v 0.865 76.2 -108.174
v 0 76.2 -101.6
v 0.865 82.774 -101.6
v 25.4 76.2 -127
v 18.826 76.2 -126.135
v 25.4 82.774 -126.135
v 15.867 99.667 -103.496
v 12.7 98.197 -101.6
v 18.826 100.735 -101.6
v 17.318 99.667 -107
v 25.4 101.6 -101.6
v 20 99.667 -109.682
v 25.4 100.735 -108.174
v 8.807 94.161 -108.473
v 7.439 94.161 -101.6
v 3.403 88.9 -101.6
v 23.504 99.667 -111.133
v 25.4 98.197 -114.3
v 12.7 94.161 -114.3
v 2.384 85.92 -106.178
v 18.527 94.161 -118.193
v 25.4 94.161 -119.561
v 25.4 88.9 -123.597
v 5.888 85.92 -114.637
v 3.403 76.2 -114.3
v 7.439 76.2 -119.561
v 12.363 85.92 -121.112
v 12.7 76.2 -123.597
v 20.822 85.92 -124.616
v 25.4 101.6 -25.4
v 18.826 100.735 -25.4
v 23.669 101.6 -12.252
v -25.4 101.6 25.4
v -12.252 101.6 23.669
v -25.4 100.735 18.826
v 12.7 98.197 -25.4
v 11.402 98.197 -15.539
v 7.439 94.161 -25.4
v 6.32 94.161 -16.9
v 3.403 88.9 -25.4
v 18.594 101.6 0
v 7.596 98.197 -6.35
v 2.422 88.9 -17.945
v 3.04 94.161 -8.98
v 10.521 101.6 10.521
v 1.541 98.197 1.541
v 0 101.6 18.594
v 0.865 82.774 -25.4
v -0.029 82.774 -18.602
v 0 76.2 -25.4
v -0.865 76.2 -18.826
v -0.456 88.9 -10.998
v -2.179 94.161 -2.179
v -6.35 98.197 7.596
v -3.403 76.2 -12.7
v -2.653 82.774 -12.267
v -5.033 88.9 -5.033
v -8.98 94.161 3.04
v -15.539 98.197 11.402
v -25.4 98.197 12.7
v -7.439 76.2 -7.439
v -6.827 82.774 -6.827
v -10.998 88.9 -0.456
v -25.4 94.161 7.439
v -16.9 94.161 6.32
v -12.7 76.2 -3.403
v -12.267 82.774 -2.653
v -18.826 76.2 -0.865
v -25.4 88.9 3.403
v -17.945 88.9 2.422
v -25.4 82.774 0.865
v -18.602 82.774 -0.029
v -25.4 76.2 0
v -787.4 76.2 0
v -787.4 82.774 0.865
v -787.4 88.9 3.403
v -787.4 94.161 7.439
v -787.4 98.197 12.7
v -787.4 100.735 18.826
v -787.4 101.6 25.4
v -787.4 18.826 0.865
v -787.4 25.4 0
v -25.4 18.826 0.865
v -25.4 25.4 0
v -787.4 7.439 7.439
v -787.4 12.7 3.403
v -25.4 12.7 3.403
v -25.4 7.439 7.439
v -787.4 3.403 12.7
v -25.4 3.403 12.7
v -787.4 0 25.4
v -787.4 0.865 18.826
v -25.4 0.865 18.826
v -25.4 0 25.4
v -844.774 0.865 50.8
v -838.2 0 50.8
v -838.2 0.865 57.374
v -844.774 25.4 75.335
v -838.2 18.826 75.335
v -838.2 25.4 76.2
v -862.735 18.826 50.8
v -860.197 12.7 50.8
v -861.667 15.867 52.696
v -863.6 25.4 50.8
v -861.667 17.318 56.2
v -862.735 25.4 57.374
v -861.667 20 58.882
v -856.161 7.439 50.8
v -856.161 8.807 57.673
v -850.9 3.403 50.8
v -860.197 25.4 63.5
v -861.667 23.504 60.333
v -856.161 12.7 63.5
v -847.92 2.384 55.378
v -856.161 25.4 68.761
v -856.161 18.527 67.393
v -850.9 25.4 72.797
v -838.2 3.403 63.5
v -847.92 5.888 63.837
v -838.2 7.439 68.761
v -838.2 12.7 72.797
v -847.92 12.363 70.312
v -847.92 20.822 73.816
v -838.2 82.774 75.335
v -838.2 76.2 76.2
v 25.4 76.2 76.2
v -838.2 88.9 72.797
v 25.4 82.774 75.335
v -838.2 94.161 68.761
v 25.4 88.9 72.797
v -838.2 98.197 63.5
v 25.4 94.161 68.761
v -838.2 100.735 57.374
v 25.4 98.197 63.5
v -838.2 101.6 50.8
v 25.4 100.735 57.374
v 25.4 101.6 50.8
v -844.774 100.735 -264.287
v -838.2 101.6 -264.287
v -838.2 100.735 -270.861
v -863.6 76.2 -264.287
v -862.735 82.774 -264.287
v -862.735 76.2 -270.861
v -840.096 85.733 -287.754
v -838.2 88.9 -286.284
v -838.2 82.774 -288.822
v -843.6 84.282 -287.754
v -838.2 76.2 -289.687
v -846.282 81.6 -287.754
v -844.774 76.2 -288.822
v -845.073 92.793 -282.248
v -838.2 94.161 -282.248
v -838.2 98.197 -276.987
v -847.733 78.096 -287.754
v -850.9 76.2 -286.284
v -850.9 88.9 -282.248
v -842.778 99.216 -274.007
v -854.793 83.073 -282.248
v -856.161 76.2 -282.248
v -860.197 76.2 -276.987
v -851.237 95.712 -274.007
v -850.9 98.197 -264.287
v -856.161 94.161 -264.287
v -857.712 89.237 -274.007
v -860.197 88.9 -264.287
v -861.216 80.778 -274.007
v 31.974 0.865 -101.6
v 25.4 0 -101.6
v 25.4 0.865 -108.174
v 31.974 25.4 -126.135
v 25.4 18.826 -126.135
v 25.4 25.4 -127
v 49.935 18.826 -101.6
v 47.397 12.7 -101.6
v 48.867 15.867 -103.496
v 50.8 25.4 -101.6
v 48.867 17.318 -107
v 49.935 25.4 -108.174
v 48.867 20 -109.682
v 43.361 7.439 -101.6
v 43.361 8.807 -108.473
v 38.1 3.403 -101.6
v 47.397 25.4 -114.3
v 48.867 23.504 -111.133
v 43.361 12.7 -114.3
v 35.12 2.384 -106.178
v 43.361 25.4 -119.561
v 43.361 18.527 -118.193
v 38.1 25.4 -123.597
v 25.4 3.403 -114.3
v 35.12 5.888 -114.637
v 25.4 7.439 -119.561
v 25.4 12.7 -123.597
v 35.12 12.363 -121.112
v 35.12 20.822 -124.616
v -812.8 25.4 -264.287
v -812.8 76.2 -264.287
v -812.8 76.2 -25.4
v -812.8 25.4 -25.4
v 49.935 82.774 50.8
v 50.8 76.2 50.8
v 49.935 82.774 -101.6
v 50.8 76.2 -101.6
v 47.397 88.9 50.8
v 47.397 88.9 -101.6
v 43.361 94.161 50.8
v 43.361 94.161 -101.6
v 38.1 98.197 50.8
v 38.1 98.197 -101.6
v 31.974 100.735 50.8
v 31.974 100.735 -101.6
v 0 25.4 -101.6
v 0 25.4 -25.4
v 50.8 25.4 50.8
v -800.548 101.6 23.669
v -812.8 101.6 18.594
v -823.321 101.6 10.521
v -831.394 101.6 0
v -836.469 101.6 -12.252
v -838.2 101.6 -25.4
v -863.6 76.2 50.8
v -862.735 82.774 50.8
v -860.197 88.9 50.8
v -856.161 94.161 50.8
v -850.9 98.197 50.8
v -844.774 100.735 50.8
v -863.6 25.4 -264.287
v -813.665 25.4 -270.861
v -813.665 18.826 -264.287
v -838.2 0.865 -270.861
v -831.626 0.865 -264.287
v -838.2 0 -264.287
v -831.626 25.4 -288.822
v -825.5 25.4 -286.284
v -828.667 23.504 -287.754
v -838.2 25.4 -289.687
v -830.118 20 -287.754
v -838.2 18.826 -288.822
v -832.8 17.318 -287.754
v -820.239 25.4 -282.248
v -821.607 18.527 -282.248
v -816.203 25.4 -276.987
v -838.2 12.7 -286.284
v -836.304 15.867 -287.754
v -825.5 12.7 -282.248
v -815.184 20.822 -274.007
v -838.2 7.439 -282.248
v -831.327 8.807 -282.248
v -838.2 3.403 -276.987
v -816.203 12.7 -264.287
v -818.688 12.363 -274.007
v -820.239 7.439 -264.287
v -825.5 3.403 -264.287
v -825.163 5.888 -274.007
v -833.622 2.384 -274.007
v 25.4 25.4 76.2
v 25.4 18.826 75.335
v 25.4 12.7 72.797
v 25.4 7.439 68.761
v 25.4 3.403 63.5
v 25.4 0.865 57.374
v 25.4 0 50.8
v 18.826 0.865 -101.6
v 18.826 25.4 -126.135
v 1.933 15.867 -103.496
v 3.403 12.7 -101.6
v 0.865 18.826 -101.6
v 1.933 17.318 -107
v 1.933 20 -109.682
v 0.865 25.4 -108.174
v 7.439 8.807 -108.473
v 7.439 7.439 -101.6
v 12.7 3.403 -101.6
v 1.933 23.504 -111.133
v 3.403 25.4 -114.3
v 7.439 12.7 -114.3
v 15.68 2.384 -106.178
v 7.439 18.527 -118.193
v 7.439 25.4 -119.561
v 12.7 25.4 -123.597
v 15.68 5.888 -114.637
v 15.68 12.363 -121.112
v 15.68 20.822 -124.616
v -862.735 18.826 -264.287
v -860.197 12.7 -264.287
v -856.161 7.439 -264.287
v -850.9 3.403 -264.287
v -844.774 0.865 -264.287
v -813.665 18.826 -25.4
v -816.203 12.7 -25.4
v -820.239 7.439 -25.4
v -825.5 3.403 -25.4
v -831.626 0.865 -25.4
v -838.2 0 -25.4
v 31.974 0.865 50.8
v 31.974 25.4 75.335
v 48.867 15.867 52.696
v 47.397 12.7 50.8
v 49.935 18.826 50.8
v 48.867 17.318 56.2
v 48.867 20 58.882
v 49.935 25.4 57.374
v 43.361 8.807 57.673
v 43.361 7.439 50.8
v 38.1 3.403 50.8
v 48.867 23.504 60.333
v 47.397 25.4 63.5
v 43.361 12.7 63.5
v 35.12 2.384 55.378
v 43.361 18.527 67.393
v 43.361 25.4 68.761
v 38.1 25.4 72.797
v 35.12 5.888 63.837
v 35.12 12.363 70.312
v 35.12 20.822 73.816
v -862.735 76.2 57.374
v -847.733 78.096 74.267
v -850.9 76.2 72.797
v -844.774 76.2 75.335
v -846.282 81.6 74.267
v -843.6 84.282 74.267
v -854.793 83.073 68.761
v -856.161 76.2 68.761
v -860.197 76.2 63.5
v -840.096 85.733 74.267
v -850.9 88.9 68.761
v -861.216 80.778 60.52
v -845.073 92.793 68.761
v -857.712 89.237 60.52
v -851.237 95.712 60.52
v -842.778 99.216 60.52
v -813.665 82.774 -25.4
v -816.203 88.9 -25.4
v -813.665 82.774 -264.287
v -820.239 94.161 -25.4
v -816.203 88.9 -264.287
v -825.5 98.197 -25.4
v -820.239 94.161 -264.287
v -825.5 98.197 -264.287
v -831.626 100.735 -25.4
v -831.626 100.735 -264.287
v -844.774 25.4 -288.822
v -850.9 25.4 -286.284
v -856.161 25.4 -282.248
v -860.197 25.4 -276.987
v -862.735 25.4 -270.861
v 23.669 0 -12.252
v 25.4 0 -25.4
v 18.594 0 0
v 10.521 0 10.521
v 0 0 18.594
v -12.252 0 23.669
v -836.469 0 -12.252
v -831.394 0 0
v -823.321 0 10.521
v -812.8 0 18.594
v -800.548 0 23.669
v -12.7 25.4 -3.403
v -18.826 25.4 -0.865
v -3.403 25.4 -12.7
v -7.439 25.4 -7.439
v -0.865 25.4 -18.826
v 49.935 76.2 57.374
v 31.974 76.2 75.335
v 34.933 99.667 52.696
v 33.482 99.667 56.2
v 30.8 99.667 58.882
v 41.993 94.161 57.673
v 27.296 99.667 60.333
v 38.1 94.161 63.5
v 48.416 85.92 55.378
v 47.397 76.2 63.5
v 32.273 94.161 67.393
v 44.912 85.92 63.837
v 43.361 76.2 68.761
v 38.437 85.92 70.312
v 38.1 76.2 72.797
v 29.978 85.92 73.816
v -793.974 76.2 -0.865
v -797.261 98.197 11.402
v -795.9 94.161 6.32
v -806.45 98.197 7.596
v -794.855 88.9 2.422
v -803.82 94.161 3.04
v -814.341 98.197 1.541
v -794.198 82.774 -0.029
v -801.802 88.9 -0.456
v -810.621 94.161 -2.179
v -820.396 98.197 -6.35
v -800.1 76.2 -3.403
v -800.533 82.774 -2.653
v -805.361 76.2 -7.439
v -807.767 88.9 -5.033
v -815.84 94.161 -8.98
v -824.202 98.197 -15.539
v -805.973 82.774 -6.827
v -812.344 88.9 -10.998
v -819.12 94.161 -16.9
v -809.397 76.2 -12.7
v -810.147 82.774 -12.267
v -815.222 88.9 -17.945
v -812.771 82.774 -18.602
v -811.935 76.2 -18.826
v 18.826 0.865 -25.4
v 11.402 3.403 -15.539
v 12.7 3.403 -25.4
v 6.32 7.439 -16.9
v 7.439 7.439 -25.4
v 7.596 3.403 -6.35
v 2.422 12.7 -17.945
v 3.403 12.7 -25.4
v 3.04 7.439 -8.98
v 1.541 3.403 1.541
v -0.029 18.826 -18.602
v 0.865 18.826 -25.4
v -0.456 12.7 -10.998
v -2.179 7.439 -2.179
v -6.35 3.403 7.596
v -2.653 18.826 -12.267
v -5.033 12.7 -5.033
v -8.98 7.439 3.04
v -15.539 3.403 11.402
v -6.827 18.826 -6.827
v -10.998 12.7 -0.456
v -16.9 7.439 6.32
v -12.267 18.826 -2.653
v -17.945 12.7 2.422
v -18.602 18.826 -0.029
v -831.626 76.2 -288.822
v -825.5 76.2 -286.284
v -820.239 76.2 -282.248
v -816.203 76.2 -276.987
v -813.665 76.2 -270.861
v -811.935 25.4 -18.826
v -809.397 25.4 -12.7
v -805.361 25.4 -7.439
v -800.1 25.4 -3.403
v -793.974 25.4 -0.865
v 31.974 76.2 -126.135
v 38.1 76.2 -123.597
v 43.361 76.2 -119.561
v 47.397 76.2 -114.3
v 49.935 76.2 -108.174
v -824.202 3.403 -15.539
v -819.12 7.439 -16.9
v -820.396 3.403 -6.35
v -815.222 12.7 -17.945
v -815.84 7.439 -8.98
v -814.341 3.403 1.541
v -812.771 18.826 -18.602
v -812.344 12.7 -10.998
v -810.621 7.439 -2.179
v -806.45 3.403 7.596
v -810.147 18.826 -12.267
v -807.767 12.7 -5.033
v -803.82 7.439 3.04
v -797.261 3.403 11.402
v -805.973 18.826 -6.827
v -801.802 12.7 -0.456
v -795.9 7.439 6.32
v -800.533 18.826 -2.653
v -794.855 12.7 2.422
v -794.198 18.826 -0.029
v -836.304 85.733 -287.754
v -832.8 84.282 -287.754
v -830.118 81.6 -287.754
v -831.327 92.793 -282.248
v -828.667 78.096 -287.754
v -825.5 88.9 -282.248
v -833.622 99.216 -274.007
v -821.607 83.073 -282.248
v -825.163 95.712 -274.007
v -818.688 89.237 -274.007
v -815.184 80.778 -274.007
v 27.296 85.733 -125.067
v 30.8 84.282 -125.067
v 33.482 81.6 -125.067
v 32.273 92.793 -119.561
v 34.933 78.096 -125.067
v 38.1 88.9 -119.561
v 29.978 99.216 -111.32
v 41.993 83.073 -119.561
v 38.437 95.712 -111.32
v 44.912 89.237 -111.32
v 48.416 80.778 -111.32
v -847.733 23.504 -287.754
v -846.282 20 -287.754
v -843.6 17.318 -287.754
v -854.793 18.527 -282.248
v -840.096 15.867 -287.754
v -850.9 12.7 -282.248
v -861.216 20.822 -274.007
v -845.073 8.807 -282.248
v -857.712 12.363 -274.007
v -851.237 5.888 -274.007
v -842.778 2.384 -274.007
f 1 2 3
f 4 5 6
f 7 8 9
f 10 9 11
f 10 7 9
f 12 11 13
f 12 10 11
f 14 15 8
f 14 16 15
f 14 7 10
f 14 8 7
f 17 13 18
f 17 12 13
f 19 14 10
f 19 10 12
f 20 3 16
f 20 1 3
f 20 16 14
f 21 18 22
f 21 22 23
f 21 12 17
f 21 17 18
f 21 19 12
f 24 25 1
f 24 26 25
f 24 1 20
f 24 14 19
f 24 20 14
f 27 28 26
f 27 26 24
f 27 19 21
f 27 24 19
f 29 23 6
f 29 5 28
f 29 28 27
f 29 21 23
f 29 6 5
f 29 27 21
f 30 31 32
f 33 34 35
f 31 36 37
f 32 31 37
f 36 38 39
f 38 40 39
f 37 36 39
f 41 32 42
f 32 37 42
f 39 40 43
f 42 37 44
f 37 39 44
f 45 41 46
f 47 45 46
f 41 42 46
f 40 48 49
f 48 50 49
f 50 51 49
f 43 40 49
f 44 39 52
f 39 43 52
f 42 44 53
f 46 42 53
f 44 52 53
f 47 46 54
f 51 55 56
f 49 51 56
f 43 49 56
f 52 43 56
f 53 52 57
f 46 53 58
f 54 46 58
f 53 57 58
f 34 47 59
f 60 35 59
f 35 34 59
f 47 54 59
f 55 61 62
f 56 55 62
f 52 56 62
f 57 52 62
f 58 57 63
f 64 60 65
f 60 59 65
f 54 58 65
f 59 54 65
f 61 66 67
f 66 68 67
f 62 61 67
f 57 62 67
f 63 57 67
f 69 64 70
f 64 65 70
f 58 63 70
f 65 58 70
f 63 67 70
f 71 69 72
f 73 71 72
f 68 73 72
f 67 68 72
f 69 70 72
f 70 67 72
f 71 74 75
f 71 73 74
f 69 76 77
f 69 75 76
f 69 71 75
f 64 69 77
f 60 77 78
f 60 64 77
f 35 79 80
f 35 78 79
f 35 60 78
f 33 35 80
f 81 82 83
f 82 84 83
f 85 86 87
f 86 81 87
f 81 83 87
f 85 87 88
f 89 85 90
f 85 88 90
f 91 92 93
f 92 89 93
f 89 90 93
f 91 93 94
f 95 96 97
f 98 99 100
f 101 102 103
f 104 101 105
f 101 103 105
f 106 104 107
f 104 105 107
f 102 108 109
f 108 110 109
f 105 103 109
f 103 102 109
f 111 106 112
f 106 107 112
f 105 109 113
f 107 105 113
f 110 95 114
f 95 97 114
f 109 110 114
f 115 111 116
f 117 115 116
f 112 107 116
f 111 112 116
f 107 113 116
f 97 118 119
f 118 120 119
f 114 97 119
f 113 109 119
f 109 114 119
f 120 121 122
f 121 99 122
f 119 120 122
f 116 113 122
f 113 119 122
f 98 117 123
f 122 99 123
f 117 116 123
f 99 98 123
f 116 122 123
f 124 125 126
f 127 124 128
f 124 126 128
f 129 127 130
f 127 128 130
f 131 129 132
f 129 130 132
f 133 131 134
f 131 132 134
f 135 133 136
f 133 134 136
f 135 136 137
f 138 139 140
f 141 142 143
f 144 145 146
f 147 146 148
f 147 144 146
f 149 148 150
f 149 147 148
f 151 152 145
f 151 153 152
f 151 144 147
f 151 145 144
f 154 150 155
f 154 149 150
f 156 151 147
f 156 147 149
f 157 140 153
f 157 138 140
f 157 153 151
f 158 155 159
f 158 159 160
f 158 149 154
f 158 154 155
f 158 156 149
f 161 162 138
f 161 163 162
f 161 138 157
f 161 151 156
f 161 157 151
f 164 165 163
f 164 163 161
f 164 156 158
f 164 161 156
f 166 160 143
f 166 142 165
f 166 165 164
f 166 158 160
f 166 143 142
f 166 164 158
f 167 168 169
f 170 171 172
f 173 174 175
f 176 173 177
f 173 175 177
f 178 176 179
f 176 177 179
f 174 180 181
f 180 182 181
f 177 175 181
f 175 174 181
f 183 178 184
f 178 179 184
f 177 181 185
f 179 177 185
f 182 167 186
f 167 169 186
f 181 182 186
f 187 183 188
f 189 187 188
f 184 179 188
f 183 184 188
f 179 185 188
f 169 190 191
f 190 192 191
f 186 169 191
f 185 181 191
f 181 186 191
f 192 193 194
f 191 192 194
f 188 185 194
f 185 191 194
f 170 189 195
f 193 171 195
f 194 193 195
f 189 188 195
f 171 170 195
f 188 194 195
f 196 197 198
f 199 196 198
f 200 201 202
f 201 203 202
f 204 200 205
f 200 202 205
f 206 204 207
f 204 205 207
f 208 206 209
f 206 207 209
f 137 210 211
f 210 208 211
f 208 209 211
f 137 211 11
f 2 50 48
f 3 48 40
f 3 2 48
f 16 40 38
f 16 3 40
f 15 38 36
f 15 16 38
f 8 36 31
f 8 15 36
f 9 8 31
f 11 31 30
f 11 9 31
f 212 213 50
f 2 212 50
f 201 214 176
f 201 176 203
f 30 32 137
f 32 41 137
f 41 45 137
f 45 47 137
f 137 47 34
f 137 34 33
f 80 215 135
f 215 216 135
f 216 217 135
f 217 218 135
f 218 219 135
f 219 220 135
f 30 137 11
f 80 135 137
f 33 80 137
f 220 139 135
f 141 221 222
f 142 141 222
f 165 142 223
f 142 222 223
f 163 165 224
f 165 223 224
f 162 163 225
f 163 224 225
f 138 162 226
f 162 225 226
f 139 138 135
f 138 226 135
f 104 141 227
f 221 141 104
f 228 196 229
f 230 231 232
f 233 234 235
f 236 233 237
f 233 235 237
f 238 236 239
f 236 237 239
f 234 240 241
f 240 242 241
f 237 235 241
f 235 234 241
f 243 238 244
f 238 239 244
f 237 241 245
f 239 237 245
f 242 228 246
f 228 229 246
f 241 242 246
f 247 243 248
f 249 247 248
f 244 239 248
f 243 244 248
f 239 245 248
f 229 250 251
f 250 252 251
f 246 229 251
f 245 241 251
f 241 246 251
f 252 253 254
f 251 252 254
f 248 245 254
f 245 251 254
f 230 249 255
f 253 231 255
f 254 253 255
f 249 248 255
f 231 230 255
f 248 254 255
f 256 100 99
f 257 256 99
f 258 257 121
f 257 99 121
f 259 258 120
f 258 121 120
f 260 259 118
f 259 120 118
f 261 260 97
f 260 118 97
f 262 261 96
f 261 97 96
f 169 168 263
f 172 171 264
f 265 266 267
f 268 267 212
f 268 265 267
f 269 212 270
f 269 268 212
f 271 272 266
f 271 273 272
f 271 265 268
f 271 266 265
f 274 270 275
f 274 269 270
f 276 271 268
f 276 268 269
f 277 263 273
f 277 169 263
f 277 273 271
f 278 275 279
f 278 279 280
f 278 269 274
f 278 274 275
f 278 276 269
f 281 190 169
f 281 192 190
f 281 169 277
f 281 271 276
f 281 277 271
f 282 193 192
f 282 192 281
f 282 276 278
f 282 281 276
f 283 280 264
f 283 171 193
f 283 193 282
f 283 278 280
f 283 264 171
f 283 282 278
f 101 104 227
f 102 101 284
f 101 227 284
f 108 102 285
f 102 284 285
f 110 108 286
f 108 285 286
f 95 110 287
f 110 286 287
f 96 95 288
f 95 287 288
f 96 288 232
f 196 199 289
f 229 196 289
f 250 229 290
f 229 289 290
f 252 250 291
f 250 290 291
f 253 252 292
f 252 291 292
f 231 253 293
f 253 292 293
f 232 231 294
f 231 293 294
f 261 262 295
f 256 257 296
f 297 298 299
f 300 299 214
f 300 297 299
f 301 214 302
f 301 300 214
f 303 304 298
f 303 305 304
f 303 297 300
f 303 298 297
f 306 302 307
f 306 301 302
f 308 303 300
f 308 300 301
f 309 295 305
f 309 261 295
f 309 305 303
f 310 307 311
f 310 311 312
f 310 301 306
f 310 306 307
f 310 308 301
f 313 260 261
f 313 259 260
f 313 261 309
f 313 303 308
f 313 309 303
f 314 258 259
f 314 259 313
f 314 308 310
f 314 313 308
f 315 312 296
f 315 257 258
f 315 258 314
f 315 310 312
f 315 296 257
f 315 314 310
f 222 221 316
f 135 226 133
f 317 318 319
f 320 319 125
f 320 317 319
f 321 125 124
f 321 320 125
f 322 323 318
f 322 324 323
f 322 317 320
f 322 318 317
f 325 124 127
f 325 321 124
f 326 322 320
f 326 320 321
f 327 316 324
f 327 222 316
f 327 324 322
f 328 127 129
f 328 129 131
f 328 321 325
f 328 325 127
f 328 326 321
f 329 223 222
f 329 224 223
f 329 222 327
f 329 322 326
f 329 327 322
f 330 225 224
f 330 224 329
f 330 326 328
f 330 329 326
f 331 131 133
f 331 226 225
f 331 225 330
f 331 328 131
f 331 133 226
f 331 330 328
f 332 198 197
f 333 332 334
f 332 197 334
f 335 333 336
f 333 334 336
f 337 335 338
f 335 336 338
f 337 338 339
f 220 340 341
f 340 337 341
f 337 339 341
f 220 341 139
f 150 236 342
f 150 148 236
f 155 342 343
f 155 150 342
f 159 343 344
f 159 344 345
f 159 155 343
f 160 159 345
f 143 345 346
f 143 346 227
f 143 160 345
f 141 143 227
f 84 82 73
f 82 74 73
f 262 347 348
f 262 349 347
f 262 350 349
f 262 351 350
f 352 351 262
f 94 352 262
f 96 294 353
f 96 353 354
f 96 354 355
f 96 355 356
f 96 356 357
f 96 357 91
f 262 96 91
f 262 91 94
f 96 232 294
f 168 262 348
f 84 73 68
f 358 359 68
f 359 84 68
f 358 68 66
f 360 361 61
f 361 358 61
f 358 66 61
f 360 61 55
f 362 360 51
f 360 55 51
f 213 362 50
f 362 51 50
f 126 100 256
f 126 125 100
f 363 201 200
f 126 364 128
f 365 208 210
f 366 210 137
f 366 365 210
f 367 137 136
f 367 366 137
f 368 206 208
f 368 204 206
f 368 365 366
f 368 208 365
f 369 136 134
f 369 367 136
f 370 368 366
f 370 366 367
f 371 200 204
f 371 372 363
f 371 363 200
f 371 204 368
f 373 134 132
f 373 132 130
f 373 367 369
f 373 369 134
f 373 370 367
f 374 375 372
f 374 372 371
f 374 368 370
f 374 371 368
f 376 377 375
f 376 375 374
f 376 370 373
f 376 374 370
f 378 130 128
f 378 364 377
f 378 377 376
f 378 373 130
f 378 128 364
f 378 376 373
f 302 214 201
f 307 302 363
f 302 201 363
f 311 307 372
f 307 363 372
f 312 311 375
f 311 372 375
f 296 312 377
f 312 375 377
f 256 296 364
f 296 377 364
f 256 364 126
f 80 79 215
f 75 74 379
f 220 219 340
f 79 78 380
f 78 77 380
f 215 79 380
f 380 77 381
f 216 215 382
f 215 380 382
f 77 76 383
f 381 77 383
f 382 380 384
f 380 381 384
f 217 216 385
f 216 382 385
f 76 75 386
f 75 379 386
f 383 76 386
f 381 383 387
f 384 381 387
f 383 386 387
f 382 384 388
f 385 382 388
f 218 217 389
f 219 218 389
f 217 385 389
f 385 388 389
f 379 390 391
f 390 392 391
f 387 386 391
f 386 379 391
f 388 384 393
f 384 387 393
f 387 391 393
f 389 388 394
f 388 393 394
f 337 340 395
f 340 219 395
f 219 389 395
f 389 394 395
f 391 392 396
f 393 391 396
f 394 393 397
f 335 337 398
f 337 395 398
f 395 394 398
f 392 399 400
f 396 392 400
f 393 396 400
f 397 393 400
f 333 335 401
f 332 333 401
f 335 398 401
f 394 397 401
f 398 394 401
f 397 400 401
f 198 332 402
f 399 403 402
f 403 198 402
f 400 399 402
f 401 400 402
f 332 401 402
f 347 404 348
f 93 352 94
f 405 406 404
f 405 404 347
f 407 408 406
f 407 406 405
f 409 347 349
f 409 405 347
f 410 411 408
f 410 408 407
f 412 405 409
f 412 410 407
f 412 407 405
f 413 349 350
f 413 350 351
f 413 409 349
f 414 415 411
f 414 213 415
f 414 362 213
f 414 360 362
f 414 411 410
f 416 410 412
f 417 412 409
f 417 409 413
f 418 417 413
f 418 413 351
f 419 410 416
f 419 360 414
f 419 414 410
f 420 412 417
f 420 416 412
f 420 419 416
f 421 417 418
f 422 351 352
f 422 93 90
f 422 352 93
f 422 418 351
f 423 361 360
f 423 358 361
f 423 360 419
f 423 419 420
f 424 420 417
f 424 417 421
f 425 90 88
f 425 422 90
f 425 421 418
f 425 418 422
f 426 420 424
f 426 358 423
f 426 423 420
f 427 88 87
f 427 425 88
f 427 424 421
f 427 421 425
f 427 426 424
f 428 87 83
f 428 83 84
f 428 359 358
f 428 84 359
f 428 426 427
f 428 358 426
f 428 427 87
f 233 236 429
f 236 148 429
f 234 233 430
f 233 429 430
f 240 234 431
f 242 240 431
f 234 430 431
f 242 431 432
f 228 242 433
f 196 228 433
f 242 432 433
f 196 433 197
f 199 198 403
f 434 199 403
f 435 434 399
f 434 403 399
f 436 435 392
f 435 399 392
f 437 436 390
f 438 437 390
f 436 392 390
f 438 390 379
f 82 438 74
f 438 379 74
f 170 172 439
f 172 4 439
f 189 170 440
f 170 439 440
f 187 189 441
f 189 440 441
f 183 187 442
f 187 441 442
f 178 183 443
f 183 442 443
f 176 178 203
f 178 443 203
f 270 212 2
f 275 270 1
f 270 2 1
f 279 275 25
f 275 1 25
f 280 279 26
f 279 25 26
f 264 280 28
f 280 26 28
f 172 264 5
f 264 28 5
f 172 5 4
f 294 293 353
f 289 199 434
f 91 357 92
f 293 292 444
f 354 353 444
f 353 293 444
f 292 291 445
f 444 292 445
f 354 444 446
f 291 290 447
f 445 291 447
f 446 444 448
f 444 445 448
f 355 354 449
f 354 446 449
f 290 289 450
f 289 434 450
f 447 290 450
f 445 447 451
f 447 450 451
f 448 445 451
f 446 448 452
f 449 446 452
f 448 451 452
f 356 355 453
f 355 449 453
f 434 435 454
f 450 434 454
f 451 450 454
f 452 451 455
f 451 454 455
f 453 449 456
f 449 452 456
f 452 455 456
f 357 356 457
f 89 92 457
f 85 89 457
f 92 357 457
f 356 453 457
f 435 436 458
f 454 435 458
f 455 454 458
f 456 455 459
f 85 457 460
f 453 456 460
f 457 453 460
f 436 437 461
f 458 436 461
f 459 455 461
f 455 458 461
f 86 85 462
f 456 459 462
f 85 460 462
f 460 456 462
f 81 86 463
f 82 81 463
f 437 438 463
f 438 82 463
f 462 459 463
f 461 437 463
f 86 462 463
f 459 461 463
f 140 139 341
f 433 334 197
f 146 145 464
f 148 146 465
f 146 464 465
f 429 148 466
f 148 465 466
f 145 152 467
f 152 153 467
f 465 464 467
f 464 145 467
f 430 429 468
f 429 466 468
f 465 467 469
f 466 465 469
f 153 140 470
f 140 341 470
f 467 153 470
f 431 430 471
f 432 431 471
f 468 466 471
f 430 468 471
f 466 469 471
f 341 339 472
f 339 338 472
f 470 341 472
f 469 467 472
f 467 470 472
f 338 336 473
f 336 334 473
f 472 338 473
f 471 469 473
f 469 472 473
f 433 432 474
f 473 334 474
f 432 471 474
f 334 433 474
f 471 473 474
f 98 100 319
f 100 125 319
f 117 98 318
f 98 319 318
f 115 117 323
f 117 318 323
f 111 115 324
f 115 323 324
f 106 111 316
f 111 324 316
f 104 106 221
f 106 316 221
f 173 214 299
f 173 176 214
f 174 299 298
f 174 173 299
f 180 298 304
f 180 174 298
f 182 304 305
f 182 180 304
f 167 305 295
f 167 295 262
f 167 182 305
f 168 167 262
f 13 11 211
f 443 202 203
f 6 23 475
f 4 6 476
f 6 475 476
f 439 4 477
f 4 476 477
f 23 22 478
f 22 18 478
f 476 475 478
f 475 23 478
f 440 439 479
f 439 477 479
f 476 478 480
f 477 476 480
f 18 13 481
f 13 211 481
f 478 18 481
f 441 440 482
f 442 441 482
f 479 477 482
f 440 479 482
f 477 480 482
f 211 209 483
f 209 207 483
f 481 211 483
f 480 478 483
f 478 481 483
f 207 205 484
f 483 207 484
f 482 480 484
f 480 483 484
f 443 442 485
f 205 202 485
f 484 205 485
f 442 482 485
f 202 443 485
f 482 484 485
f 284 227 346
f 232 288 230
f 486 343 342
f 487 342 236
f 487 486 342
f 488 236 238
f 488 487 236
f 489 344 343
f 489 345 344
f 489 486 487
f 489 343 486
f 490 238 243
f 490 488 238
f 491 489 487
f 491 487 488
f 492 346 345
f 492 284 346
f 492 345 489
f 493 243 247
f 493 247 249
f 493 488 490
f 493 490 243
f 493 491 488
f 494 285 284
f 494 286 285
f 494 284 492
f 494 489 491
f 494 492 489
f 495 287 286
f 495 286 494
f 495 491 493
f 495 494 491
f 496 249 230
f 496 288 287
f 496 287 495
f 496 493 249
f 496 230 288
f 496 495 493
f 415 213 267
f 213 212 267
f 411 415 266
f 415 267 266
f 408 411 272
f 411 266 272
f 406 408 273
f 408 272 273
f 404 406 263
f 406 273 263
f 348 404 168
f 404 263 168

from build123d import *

# Parameters (mm, degrees)
SKETCH1_W           = 812.8
SKETCH1_H           = 101.6
BOSS_EXTRUDE1_DEPTH = 76.2
SKETCH2_W           = 50.8
SKETCH2_H           = 101.6
BOSS_EXTRUDE2_DEPTH = 203.2
SKETCH6_W           = 365.887
SKETCH6_H           = 101.6
BOSS_EXTRUDE5_DEPTH = 50.8
FILLET4_R           = 25.4


with BuildPart() as part:
    # Sketch1 → Boss-Extrude1 (new body)
    with BuildSketch(Plane.XY):
        with Locations((-406.4, 50.8)):
            Rectangle(SKETCH1_W, SKETCH1_H)
    extrude(amount=BOSS_EXTRUDE1_DEPTH)

    # Sketch2 → Boss-Extrude2 (add)
    with BuildSketch(Plane.XY.offset(76.2)):
        with Locations((-838.2, 50.8)):
            Rectangle(SKETCH2_W, SKETCH2_H)
        with Locations((25.4, 50.8)):
            Rectangle(SKETCH2_W, SKETCH2_H)
    extrude(amount=-BOSS_EXTRUDE2_DEPTH)

    # Sketch6 → Boss-Extrude5 (add)
    with BuildSketch(Plane.ZY.offset(863.6)):
        with Locations((-106.7435, 50.8)):
            Rectangle(SKETCH6_W, SKETCH6_H)
    extrude(amount=-BOSS_EXTRUDE5_DEPTH)

    # Fillet4
    fillet4_edges = [part.edges().sort_by_distance(p)[0] for p in [
        (-406.4, 0, 76.2),
        (-812.8, 101.6, -144.8435),
        (-863.6, 101.6, -106.7435),
        (-812.8, 0, -144.8435),
        (-863.6, 0, -106.7435),
        (-863.6, 50.8, 76.2),
        (25.4, 0, -127),
        (50.8, 0, -25.4),
        (0, 0, -63.5),
        (0, 50.8, -127),
        (0, 101.6, -63.5),
        (50.8, 50.8, 76.2),
        (50.8, 101.6, -25.4),
        (25.4, 101.6, -127),
        (50.8, 50.8, -127),
        (-838.2, 101.6, -289.687),
        (-863.6, 50.8, -289.687),
        (-812.8, 50.8, -289.687),
        (-838.2, 0, -289.687),
        (-406.4, 0, 0),
        (-812.8, 50.8, 0),
        (-406.4, 101.6, 0),
        (0, 50.8, 0),
        (-406.4, 101.6, 76.2),
    ]]
    fillet(fillet4_edges, radius=FILLET4_R - 0.0001)  # a hair under: the kernel refuses the full size


solid = part.part
